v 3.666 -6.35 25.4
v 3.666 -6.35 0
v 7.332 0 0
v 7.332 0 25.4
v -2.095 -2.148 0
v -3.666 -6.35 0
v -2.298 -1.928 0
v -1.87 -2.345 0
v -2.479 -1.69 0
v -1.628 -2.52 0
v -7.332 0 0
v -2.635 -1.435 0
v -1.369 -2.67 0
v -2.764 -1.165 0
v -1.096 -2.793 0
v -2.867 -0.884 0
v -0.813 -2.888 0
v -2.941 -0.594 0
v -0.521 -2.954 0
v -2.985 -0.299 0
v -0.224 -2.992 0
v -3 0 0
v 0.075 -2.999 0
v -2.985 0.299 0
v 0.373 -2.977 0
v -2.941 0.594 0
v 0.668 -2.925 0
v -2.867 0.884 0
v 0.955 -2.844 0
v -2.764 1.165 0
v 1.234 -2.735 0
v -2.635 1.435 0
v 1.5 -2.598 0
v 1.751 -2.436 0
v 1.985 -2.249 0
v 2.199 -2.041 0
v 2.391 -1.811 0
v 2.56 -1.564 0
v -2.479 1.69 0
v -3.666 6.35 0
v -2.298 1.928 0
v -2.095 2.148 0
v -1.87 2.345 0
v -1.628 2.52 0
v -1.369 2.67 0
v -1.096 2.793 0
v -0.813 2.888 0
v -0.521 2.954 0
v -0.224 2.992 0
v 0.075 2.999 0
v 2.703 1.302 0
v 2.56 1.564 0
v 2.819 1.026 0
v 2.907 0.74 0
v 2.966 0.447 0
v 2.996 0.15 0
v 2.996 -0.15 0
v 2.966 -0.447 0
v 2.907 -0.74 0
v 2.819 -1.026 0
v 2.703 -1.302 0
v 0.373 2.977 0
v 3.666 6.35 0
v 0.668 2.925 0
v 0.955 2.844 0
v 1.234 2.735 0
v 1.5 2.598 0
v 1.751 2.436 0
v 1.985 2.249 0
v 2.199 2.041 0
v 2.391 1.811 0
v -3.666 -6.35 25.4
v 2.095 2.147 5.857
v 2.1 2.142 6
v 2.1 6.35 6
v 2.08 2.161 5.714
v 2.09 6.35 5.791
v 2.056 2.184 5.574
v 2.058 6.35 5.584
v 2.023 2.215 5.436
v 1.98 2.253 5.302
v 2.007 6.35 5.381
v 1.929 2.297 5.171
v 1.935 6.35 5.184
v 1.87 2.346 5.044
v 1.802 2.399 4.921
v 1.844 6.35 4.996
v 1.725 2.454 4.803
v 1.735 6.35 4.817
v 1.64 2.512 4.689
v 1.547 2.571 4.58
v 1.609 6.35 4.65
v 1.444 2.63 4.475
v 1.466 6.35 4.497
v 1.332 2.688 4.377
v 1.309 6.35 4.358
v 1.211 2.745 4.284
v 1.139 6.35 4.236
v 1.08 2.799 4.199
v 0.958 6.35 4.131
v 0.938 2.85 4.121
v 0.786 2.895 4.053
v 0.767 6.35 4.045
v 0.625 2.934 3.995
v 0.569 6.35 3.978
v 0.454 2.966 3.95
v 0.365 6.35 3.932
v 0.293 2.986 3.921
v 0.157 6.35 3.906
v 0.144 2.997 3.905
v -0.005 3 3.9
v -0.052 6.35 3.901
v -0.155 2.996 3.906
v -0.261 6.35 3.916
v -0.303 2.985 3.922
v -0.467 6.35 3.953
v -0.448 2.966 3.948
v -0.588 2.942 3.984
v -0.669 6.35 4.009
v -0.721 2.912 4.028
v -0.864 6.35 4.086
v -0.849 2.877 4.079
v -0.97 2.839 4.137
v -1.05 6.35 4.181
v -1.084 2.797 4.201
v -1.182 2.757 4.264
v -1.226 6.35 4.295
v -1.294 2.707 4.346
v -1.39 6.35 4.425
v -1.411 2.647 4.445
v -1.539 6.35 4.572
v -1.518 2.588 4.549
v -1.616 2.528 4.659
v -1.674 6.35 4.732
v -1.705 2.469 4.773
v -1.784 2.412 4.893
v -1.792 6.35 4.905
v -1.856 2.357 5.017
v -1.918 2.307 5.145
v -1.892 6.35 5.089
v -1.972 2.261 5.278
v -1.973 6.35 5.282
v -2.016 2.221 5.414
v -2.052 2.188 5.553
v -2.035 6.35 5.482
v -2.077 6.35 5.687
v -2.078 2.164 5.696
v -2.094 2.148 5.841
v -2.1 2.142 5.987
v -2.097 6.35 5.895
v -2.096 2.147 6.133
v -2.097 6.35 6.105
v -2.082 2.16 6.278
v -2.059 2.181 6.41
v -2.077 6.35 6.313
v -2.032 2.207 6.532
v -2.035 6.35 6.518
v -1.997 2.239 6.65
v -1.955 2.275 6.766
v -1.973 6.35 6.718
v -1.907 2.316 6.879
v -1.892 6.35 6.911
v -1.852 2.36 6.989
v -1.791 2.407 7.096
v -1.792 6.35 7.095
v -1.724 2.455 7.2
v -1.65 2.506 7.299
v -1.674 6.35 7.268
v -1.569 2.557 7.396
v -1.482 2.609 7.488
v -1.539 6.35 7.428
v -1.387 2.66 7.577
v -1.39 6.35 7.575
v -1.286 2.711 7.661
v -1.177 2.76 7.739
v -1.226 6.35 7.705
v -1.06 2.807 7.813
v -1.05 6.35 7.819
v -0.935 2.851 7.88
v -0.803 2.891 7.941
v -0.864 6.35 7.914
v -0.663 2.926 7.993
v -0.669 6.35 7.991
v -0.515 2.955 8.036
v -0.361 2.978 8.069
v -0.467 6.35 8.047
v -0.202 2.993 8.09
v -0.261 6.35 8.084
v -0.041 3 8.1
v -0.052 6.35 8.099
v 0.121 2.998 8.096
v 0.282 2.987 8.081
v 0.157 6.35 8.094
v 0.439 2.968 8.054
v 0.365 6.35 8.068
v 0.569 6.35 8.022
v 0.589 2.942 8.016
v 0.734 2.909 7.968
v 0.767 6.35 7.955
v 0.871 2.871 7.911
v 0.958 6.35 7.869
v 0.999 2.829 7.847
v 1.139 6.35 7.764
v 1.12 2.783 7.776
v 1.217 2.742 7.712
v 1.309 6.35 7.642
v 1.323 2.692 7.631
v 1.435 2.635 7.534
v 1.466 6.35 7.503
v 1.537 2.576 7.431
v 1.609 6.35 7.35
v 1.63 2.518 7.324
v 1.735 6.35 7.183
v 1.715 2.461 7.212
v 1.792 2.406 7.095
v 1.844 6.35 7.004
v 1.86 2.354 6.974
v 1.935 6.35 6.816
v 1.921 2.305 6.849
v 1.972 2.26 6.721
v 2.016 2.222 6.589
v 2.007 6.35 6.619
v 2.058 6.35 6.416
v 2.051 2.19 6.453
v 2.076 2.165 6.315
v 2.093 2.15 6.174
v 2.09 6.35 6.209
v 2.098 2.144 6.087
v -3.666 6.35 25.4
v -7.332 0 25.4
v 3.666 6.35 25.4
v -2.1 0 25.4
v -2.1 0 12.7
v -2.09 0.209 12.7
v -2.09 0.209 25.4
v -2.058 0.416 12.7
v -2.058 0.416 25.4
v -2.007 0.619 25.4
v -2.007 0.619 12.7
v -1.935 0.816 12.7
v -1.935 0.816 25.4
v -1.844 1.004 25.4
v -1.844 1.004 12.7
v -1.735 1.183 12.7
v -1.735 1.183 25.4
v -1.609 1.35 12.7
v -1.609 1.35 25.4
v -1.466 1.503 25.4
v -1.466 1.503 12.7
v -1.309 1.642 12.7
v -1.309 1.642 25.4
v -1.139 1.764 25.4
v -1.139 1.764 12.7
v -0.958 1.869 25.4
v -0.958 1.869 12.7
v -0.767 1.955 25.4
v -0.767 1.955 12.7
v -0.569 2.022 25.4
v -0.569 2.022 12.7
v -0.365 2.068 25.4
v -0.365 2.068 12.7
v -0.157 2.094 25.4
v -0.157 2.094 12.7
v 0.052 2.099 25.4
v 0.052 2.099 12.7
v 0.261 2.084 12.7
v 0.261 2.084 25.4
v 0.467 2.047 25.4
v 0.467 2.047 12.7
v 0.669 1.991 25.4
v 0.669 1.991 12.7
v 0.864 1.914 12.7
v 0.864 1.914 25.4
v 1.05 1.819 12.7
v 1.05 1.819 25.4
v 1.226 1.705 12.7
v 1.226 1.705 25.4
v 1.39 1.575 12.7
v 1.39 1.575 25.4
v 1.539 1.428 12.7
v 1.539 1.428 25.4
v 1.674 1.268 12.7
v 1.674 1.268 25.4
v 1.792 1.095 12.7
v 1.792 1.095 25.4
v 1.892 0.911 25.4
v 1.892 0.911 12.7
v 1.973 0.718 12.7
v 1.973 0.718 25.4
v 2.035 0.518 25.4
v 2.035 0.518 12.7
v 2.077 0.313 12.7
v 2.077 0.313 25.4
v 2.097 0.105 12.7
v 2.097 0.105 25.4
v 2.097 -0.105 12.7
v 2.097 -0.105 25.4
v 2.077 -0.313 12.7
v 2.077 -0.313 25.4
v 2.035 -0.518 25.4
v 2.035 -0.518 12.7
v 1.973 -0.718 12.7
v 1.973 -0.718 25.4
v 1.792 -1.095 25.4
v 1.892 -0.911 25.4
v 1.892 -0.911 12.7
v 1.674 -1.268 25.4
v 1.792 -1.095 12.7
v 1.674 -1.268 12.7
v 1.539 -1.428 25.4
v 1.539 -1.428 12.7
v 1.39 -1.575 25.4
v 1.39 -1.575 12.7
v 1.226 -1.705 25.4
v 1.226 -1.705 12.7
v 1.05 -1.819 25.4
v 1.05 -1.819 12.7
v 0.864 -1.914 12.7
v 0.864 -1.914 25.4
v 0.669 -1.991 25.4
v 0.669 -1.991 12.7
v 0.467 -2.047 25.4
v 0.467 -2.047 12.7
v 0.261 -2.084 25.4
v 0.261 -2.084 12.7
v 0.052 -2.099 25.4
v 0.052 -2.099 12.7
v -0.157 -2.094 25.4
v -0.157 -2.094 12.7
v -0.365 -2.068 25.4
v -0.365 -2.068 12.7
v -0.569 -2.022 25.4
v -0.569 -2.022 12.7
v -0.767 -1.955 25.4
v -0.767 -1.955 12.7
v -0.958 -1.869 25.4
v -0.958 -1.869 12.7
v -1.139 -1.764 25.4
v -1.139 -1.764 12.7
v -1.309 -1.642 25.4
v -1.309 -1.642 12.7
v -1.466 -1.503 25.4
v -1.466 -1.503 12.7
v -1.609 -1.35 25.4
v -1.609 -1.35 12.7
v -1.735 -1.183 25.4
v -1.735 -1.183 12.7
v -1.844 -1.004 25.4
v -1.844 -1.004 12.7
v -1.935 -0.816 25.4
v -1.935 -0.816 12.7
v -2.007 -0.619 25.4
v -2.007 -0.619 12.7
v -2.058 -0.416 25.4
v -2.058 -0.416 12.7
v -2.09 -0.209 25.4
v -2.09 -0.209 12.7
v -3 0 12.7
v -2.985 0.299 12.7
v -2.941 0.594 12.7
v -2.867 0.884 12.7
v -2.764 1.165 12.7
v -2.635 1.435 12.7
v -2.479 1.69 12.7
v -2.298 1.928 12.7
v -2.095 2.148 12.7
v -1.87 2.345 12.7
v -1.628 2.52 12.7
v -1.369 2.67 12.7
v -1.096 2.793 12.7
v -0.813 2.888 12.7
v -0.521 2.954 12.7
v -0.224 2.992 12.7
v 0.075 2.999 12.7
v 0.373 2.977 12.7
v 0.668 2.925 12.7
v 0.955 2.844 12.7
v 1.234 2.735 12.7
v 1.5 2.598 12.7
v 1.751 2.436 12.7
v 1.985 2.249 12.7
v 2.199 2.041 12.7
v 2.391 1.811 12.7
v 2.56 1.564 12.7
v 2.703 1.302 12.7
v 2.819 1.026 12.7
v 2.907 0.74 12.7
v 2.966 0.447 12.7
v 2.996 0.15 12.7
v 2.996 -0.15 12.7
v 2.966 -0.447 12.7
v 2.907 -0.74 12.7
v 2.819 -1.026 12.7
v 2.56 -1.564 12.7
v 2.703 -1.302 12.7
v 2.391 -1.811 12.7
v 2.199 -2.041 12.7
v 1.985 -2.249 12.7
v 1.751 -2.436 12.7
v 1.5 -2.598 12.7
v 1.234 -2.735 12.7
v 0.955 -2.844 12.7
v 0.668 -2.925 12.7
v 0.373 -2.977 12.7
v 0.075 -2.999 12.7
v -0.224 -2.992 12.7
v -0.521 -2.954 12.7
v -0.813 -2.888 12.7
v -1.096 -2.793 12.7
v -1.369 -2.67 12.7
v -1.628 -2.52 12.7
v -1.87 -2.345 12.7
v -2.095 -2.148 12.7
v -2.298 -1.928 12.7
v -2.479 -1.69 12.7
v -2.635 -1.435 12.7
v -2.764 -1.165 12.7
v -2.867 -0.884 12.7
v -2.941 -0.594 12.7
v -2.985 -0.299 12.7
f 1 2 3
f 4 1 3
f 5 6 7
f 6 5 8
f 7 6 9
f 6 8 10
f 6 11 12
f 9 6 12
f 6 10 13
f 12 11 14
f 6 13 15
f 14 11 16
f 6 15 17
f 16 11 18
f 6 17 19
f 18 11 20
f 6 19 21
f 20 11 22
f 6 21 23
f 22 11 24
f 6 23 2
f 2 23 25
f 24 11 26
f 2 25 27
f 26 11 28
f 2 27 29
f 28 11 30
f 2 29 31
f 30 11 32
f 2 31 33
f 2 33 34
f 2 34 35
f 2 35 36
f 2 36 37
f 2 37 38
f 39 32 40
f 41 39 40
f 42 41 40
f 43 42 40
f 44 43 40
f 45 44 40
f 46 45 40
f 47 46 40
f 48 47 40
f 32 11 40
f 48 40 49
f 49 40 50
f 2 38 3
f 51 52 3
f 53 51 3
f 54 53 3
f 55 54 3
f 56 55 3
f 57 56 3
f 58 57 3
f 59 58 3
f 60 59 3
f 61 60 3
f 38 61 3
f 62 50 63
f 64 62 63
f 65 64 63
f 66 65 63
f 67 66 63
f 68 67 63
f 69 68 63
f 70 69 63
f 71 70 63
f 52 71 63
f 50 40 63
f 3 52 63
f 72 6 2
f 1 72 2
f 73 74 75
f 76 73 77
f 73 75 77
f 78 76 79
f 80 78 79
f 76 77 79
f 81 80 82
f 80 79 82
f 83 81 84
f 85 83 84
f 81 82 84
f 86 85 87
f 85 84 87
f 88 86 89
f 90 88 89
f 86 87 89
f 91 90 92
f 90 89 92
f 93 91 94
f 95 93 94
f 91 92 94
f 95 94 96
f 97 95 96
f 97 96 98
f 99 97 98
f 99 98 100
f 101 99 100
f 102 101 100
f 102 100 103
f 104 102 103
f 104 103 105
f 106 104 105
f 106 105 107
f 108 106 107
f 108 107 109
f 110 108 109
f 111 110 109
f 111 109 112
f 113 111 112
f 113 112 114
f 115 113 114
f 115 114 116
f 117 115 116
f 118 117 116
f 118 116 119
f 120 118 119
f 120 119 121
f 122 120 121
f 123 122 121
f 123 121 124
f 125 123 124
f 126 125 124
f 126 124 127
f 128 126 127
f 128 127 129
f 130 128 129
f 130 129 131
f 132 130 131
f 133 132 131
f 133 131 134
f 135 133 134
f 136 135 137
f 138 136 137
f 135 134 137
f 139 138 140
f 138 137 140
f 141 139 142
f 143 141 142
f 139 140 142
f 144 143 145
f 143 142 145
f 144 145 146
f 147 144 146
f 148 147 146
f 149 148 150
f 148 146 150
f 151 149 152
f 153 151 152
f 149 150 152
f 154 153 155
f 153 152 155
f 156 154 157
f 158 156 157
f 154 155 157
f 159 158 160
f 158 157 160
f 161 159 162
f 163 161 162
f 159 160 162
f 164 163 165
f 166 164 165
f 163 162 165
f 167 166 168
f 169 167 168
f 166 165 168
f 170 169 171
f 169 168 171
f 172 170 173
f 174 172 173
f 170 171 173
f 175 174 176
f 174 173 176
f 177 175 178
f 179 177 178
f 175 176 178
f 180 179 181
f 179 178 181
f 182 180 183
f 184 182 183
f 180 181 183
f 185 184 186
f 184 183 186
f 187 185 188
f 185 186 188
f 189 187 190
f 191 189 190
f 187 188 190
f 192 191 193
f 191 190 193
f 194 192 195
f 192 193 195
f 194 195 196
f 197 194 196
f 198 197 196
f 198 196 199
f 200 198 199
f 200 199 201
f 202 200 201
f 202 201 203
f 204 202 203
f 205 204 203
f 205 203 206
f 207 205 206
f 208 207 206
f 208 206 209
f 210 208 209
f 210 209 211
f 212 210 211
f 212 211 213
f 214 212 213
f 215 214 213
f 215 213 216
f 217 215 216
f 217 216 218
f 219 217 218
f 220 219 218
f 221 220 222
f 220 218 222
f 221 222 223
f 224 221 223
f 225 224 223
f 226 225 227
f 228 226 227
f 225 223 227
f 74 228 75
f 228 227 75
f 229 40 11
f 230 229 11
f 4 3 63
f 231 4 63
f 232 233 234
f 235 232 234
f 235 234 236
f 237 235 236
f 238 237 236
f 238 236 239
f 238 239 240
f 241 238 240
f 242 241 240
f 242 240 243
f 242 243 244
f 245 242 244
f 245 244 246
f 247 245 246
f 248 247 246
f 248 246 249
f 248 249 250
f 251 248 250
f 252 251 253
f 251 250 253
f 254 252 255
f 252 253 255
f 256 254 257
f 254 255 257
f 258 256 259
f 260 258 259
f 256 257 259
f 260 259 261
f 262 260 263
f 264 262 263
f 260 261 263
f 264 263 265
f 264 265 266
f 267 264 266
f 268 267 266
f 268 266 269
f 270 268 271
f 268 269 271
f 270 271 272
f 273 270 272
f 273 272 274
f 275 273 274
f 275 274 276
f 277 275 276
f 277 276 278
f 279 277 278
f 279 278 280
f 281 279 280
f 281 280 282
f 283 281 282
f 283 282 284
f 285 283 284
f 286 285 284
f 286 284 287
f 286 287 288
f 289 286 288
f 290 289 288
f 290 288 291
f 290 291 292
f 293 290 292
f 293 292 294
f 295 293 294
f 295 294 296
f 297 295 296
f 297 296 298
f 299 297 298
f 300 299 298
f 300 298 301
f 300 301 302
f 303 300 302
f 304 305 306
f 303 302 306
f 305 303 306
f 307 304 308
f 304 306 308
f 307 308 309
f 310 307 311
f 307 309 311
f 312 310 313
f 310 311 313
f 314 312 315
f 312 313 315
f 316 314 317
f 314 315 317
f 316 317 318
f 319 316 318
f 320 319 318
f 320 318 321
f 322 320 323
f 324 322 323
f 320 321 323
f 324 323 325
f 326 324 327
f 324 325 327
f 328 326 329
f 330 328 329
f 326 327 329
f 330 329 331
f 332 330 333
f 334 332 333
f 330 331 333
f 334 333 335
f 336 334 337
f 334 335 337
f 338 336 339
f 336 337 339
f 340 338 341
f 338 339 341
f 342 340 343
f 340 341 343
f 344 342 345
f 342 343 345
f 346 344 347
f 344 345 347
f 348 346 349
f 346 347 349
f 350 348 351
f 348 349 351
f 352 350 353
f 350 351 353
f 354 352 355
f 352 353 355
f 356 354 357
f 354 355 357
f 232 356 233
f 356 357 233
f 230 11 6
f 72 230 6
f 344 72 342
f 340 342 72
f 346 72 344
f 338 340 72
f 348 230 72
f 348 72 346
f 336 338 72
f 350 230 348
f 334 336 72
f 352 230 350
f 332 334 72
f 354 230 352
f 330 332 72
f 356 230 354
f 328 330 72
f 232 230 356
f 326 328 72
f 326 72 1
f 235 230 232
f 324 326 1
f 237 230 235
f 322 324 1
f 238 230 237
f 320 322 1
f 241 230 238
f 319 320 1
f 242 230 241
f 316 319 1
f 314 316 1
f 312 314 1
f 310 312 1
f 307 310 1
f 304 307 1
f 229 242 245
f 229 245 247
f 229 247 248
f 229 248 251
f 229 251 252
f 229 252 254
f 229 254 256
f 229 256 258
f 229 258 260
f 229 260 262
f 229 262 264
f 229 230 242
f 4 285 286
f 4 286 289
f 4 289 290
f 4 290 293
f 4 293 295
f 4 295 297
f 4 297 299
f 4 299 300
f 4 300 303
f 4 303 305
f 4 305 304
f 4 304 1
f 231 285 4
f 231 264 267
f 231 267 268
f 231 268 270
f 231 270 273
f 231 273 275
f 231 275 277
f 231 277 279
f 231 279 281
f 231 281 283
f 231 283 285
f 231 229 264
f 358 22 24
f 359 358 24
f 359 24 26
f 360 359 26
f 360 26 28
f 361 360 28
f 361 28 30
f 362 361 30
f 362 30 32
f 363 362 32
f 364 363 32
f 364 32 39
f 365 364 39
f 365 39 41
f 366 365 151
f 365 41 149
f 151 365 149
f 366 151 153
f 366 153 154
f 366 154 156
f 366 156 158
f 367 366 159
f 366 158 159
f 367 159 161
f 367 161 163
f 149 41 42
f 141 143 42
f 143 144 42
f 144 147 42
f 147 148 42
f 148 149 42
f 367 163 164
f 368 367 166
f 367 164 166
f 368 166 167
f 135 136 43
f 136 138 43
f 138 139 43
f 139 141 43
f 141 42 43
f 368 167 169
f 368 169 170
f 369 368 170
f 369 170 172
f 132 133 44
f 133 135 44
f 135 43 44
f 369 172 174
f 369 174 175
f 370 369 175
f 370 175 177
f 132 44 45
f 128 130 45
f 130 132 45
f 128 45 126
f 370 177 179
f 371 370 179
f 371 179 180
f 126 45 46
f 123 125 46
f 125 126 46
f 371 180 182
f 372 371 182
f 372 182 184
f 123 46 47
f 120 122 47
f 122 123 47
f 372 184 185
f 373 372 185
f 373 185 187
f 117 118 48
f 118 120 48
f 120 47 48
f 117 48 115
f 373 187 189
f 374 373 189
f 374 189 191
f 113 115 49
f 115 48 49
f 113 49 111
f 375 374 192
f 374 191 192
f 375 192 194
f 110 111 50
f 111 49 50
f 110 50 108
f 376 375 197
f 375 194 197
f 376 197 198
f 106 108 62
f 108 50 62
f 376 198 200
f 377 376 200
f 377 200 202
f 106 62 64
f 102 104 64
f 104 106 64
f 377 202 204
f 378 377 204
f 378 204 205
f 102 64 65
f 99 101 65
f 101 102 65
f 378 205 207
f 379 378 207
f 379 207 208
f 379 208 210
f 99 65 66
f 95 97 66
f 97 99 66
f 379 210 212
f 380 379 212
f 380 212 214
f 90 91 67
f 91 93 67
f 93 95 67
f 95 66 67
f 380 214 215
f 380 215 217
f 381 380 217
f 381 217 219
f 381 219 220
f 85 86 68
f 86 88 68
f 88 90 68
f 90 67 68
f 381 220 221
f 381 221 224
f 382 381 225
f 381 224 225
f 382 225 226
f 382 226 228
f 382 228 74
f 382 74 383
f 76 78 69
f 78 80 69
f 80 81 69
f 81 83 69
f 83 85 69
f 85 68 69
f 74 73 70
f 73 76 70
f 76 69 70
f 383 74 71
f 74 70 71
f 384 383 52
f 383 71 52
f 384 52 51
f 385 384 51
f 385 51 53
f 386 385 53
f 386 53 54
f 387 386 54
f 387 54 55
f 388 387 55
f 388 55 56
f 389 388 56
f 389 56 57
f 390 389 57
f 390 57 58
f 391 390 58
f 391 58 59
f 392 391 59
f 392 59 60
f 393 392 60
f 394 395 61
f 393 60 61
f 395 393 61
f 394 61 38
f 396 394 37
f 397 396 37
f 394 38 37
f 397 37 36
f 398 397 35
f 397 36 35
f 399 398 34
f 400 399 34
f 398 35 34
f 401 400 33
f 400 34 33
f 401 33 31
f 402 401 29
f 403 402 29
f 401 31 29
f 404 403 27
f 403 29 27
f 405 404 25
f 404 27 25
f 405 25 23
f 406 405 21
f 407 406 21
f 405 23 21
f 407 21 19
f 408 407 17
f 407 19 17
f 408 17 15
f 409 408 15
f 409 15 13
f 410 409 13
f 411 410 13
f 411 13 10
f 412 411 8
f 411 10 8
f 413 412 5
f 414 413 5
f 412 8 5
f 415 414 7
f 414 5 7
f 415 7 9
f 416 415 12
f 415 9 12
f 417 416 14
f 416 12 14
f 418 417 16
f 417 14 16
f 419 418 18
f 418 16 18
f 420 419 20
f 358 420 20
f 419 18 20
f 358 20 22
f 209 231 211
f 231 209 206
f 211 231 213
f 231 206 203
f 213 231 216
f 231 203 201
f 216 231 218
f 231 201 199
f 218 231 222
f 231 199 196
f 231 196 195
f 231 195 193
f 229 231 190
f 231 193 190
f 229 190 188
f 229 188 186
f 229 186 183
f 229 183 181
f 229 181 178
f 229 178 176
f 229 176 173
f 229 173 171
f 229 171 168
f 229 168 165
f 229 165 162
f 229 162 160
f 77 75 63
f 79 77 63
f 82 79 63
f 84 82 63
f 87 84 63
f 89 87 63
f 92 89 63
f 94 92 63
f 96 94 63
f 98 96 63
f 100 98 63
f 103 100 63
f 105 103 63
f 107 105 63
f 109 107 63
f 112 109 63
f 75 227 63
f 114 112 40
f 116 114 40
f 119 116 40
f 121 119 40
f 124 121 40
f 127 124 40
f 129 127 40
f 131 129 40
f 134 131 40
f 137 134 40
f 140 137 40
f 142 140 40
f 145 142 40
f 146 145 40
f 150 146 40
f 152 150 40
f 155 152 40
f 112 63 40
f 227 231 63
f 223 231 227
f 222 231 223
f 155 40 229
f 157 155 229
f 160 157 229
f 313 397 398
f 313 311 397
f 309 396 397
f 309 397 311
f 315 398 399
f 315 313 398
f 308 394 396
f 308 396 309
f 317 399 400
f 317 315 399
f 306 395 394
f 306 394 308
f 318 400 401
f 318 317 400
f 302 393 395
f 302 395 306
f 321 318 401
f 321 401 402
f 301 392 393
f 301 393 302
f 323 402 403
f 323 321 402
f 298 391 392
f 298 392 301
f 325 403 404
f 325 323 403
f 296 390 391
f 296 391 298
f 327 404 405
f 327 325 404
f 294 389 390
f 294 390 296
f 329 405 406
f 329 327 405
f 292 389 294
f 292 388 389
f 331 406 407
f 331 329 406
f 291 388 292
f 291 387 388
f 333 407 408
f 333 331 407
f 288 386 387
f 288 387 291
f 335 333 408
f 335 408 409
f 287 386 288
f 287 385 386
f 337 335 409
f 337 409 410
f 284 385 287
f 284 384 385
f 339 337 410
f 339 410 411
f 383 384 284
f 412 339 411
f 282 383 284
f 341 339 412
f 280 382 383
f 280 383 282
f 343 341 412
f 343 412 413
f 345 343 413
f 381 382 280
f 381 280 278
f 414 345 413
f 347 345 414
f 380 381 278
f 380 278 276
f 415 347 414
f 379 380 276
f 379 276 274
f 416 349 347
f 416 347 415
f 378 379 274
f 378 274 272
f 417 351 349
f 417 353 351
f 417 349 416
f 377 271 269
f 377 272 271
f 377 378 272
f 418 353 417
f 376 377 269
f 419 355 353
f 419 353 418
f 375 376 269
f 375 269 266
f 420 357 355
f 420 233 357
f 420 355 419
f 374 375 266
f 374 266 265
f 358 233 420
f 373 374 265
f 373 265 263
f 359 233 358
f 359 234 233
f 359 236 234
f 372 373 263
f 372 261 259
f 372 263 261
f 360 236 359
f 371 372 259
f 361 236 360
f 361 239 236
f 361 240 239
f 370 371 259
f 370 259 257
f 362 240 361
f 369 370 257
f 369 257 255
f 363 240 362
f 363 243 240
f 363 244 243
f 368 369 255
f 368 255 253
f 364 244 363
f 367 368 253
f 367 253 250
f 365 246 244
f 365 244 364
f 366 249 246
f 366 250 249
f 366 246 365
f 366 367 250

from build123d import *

# Parameters (mm, degrees)
BOSS_EXTRUDE1_DEPTH              = 25.4
SKETCH2_R                        = 3
CUT_EXTRUDE1_DEPTH               = 12.7
TAP_DRILL_FOR_M5X0_8_TAP1_D      = 4.2
TAP_DRILL_FOR_M5X0_8_TAP2_REACH  = 26.319
TAP_DRILL_FOR_M5X0_8_TAP2_BORE_R = 2.1


with BuildPart() as part:
    # Sketch1 → Boss-Extrude1 (new body)
    with BuildSketch(Plane.XY):
        Polygon((7.332348419, 0), (3.666174209, 6.35), (-3.666174209, 6.35), (-7.332348419, 0), (-3.666174209, -6.35), (3.666174209, -6.35), align=None)
    extrude(amount=BOSS_EXTRUDE1_DEPTH)

    # Sketch2 → Cut-Extrude1 (cut)
    with BuildSketch(Plane(origin=(0, 0, 0), x_dir=(-1, 0, 0), z_dir=(0, 0, -1))):
        Circle(SKETCH2_R)
    extrude(amount=-CUT_EXTRUDE1_DEPTH, mode=Mode.SUBTRACT)

    # Tap Drill for M5x0.8 Tap1 (through all)
    with Locations(Plane.XY.offset(25.4)):
        with Locations((0, 0)):
            Hole(TAP_DRILL_FOR_M5X0_8_TAP1_D / 2)

    # Tap Drill for M5x0.8 Tap2 bore (on position points) → Tap Drill for M5x0.8 Tap2 (cut, up to next)
    with BuildSketch(Plane(origin=(0, 6.35, 6), x_dir=(1, 0, 0), z_dir=(0, 1, 0)), mode=Mode.PRIVATE) as tap_drill_for_m5x0_8_tap2_sk1:
        Circle(TAP_DRILL_FOR_M5X0_8_TAP2_BORE_R)
    tap_drill_for_m5x0_8_tap2_tool1 = extrude(tap_drill_for_m5x0_8_tap2_sk1.sketch, amount=-TAP_DRILL_FOR_M5X0_8_TAP2_REACH, mode=Mode.PRIVATE) & part.part
    add(tap_drill_for_m5x0_8_tap2_tool1.solids().sort_by_distance((0, 6.35, 6))[0], mode=Mode.SUBTRACT)


solid = part.part
